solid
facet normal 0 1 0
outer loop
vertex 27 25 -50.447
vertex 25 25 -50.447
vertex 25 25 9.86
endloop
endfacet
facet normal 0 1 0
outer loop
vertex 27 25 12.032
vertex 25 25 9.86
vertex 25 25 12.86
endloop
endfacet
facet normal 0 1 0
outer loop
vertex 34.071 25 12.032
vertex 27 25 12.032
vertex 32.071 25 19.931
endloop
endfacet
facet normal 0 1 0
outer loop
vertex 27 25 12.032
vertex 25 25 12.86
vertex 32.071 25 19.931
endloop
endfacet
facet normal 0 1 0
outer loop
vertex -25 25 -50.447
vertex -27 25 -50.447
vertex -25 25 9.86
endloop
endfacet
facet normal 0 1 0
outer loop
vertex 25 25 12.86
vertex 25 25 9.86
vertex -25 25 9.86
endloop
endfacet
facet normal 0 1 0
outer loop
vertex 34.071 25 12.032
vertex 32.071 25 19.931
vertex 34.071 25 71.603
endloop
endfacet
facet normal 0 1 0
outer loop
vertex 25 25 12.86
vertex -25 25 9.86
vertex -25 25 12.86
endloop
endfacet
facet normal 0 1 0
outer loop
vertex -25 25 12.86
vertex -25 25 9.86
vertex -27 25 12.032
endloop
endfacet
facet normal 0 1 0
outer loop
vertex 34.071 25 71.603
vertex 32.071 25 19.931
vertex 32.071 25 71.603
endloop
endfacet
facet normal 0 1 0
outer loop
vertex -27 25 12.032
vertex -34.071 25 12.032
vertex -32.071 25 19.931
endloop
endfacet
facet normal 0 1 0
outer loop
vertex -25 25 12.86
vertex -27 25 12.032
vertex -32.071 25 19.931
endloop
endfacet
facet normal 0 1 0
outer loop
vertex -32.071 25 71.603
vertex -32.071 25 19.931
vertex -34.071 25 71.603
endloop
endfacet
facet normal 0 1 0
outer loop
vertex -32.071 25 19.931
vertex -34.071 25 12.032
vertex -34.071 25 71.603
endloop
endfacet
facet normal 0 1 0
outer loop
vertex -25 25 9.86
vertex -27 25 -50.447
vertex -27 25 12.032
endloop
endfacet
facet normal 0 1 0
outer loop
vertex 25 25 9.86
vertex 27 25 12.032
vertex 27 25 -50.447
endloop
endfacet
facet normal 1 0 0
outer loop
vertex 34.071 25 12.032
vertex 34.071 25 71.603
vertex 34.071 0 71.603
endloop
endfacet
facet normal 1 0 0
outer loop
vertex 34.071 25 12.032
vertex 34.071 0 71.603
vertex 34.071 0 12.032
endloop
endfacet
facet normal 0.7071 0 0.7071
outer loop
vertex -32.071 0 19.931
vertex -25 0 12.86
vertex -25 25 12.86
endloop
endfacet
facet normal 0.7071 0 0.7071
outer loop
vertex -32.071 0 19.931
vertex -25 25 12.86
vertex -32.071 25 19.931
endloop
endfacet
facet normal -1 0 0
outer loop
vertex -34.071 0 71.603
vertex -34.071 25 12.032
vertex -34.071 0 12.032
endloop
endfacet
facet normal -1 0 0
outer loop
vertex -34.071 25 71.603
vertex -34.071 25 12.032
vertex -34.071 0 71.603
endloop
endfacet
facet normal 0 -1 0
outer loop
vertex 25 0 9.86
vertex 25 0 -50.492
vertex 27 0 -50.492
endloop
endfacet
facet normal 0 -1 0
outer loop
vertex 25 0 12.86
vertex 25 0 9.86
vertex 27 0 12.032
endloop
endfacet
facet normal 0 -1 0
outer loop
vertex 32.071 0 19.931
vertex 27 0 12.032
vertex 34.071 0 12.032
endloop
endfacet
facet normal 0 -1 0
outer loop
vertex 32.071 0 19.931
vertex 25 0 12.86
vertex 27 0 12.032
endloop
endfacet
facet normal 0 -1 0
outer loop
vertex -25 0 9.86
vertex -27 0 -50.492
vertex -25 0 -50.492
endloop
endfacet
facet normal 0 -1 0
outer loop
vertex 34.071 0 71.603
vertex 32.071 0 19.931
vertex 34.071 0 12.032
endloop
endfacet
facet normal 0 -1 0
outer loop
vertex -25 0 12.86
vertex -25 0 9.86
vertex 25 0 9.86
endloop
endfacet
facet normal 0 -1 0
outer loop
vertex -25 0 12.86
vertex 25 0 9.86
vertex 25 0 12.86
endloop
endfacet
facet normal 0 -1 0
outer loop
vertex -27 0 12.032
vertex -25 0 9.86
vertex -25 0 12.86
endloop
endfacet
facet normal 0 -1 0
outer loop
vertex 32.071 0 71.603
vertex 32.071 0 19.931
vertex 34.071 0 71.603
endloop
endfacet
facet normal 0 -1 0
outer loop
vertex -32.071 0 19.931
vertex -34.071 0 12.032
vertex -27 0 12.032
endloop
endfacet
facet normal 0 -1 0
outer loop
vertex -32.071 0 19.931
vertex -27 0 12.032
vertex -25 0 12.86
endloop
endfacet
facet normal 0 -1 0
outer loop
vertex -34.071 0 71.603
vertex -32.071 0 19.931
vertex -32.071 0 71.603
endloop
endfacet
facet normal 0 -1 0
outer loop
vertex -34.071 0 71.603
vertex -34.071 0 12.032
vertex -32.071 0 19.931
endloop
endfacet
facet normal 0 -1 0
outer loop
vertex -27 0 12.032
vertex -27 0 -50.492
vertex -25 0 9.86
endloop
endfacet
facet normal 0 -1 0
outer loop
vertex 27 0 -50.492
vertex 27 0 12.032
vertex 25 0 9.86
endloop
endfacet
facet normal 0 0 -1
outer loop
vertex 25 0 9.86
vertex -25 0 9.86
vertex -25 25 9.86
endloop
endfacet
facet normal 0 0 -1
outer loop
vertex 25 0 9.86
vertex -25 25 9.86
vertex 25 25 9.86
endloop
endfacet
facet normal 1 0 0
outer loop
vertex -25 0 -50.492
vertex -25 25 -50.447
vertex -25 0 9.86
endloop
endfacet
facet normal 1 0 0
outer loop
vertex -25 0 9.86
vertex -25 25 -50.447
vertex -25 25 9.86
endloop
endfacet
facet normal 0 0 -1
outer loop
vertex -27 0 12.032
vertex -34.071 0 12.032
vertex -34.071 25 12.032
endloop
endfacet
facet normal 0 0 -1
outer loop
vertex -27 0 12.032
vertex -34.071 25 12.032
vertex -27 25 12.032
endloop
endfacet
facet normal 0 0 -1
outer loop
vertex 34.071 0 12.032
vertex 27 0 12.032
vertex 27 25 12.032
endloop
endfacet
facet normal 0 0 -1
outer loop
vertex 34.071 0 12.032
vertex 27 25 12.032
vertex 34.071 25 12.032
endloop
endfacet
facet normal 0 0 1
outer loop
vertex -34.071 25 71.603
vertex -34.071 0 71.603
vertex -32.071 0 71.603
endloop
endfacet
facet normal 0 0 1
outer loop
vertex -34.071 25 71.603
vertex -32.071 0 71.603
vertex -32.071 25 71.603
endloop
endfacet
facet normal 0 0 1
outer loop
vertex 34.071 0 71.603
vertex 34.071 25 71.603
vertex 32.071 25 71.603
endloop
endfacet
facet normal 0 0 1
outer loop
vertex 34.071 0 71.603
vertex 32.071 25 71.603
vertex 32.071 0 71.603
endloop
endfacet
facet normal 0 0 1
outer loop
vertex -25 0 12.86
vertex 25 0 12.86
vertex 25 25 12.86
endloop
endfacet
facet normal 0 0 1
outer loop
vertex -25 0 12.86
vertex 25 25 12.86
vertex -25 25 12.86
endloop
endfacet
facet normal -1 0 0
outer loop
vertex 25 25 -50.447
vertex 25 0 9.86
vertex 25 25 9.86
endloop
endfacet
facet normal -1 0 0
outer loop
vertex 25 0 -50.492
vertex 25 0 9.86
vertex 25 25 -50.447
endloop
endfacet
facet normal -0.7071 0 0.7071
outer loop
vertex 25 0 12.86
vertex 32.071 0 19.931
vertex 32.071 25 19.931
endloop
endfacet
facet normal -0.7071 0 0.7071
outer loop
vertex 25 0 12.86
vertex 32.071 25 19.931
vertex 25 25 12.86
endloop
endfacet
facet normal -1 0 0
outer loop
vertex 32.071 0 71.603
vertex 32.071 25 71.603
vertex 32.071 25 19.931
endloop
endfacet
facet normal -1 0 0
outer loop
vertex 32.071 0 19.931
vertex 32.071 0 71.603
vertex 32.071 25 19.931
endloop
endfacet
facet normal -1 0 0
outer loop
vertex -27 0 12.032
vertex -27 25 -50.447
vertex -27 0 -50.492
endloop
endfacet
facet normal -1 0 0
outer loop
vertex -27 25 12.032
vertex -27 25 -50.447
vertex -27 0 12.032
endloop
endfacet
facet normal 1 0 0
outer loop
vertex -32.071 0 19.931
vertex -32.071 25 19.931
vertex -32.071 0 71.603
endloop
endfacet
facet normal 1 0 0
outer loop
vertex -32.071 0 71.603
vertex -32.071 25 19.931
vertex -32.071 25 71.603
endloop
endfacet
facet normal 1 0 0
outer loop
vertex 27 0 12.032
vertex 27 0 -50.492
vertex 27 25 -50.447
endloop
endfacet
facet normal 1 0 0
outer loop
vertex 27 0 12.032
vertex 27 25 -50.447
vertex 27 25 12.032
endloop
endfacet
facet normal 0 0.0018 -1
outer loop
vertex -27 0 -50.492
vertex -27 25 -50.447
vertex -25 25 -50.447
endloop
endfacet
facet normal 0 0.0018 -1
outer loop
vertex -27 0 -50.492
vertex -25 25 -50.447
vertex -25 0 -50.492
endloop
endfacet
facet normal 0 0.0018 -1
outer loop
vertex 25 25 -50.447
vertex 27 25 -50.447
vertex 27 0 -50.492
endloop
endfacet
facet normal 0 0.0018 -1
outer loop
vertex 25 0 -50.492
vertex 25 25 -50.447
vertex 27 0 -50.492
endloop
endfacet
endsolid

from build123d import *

# Parameters (mm, degrees)
BOSS_EXTRU_1_DEPTH = 25
BOSS_EXTRU_2_DEPTH = 2
BOSS_EXTRU_3_DEPTH = 2
BOSS_EXTRU_5_DEPTH = 2
ESQUISSE4_W        = 12.5
ESQUISSE4_H        = 25
BOSS_EXTRU_6_DEPTH = 2


with BuildPart() as part:
    # Esquisse1 → Boss.-Extru.1 (new body)
    with BuildSketch(Plane(origin=(0, 0, 0), x_dir=(1, 0, 0), z_dir=(0, 1, 0))):
        Polygon((-34.071067812, -19.102794325), (-34.071067812, -12.031726513), (-27, -12.031726513), (-27, 37.968273487), (-25, 37.968273487), (-25, -9.860153638), (25, -9.860153638), (25, 37.968273487), (27, 37.968273487), (27, -12.031726513), (34.071067812, -12.031726513), (34.071067812, -19.102794325), (34.071067812, -59.102794325), (32.071067812, -59.102794325), (32.071067812, -19.93122145), (25, -12.860153638), (-25, -12.860153638), (-32.071067812, -19.93122145), (-32.071067812, -59.102794325), (-34.071067812, -59.102794325), align=None)
    extrude(amount=BOSS_EXTRU_1_DEPTH)

    # Esquisse2 → Boss.-Extru.2 (add)
    with BuildSketch(Plane(origin=(34.071067812, 0, 0), x_dir=(0, 0, -1), z_dir=(1, 0, 0))):
        Polygon((-59.102794325, 25), (-71.602794325, 25), (-71.602794325, 0), (-59.102794325, 0), (-12.031726513, 0), (-12.031726513, 25), align=None)
    extrude(amount=-BOSS_EXTRU_2_DEPTH)

    # Esquisse3 → Boss.-Extru.3 (add)
    with BuildSketch(Plane(origin=(27, 0, 0), x_dir=(0, 0, -1), z_dir=(1, 0, 0))):
        Polygon((37.947300388, 25), (50.447300388, 25), (50.491690046, 0), (37.947300388, 0), align=None)
    extrude(amount=-BOSS_EXTRU_3_DEPTH)

    # Esquisse5 → Boss.-Extru.5 (add)
    with BuildSketch(Plane.ZY.offset(27)):
        Polygon((-37.968273487, 0), (-37.968273487, 25), (-50.447300388, 25), (-50.491690046, 0), align=None)
    extrude(amount=-BOSS_EXTRU_5_DEPTH)

    # Esquisse4 → Boss.-Extru.6 (add)
    with BuildSketch(Plane.ZY.offset(34.071067812)):
        with Locations((65.352794325, 12.5)):
            Rectangle(ESQUISSE4_W, ESQUISSE4_H)
    extrude(amount=-BOSS_EXTRU_6_DEPTH)


solid = part.part
